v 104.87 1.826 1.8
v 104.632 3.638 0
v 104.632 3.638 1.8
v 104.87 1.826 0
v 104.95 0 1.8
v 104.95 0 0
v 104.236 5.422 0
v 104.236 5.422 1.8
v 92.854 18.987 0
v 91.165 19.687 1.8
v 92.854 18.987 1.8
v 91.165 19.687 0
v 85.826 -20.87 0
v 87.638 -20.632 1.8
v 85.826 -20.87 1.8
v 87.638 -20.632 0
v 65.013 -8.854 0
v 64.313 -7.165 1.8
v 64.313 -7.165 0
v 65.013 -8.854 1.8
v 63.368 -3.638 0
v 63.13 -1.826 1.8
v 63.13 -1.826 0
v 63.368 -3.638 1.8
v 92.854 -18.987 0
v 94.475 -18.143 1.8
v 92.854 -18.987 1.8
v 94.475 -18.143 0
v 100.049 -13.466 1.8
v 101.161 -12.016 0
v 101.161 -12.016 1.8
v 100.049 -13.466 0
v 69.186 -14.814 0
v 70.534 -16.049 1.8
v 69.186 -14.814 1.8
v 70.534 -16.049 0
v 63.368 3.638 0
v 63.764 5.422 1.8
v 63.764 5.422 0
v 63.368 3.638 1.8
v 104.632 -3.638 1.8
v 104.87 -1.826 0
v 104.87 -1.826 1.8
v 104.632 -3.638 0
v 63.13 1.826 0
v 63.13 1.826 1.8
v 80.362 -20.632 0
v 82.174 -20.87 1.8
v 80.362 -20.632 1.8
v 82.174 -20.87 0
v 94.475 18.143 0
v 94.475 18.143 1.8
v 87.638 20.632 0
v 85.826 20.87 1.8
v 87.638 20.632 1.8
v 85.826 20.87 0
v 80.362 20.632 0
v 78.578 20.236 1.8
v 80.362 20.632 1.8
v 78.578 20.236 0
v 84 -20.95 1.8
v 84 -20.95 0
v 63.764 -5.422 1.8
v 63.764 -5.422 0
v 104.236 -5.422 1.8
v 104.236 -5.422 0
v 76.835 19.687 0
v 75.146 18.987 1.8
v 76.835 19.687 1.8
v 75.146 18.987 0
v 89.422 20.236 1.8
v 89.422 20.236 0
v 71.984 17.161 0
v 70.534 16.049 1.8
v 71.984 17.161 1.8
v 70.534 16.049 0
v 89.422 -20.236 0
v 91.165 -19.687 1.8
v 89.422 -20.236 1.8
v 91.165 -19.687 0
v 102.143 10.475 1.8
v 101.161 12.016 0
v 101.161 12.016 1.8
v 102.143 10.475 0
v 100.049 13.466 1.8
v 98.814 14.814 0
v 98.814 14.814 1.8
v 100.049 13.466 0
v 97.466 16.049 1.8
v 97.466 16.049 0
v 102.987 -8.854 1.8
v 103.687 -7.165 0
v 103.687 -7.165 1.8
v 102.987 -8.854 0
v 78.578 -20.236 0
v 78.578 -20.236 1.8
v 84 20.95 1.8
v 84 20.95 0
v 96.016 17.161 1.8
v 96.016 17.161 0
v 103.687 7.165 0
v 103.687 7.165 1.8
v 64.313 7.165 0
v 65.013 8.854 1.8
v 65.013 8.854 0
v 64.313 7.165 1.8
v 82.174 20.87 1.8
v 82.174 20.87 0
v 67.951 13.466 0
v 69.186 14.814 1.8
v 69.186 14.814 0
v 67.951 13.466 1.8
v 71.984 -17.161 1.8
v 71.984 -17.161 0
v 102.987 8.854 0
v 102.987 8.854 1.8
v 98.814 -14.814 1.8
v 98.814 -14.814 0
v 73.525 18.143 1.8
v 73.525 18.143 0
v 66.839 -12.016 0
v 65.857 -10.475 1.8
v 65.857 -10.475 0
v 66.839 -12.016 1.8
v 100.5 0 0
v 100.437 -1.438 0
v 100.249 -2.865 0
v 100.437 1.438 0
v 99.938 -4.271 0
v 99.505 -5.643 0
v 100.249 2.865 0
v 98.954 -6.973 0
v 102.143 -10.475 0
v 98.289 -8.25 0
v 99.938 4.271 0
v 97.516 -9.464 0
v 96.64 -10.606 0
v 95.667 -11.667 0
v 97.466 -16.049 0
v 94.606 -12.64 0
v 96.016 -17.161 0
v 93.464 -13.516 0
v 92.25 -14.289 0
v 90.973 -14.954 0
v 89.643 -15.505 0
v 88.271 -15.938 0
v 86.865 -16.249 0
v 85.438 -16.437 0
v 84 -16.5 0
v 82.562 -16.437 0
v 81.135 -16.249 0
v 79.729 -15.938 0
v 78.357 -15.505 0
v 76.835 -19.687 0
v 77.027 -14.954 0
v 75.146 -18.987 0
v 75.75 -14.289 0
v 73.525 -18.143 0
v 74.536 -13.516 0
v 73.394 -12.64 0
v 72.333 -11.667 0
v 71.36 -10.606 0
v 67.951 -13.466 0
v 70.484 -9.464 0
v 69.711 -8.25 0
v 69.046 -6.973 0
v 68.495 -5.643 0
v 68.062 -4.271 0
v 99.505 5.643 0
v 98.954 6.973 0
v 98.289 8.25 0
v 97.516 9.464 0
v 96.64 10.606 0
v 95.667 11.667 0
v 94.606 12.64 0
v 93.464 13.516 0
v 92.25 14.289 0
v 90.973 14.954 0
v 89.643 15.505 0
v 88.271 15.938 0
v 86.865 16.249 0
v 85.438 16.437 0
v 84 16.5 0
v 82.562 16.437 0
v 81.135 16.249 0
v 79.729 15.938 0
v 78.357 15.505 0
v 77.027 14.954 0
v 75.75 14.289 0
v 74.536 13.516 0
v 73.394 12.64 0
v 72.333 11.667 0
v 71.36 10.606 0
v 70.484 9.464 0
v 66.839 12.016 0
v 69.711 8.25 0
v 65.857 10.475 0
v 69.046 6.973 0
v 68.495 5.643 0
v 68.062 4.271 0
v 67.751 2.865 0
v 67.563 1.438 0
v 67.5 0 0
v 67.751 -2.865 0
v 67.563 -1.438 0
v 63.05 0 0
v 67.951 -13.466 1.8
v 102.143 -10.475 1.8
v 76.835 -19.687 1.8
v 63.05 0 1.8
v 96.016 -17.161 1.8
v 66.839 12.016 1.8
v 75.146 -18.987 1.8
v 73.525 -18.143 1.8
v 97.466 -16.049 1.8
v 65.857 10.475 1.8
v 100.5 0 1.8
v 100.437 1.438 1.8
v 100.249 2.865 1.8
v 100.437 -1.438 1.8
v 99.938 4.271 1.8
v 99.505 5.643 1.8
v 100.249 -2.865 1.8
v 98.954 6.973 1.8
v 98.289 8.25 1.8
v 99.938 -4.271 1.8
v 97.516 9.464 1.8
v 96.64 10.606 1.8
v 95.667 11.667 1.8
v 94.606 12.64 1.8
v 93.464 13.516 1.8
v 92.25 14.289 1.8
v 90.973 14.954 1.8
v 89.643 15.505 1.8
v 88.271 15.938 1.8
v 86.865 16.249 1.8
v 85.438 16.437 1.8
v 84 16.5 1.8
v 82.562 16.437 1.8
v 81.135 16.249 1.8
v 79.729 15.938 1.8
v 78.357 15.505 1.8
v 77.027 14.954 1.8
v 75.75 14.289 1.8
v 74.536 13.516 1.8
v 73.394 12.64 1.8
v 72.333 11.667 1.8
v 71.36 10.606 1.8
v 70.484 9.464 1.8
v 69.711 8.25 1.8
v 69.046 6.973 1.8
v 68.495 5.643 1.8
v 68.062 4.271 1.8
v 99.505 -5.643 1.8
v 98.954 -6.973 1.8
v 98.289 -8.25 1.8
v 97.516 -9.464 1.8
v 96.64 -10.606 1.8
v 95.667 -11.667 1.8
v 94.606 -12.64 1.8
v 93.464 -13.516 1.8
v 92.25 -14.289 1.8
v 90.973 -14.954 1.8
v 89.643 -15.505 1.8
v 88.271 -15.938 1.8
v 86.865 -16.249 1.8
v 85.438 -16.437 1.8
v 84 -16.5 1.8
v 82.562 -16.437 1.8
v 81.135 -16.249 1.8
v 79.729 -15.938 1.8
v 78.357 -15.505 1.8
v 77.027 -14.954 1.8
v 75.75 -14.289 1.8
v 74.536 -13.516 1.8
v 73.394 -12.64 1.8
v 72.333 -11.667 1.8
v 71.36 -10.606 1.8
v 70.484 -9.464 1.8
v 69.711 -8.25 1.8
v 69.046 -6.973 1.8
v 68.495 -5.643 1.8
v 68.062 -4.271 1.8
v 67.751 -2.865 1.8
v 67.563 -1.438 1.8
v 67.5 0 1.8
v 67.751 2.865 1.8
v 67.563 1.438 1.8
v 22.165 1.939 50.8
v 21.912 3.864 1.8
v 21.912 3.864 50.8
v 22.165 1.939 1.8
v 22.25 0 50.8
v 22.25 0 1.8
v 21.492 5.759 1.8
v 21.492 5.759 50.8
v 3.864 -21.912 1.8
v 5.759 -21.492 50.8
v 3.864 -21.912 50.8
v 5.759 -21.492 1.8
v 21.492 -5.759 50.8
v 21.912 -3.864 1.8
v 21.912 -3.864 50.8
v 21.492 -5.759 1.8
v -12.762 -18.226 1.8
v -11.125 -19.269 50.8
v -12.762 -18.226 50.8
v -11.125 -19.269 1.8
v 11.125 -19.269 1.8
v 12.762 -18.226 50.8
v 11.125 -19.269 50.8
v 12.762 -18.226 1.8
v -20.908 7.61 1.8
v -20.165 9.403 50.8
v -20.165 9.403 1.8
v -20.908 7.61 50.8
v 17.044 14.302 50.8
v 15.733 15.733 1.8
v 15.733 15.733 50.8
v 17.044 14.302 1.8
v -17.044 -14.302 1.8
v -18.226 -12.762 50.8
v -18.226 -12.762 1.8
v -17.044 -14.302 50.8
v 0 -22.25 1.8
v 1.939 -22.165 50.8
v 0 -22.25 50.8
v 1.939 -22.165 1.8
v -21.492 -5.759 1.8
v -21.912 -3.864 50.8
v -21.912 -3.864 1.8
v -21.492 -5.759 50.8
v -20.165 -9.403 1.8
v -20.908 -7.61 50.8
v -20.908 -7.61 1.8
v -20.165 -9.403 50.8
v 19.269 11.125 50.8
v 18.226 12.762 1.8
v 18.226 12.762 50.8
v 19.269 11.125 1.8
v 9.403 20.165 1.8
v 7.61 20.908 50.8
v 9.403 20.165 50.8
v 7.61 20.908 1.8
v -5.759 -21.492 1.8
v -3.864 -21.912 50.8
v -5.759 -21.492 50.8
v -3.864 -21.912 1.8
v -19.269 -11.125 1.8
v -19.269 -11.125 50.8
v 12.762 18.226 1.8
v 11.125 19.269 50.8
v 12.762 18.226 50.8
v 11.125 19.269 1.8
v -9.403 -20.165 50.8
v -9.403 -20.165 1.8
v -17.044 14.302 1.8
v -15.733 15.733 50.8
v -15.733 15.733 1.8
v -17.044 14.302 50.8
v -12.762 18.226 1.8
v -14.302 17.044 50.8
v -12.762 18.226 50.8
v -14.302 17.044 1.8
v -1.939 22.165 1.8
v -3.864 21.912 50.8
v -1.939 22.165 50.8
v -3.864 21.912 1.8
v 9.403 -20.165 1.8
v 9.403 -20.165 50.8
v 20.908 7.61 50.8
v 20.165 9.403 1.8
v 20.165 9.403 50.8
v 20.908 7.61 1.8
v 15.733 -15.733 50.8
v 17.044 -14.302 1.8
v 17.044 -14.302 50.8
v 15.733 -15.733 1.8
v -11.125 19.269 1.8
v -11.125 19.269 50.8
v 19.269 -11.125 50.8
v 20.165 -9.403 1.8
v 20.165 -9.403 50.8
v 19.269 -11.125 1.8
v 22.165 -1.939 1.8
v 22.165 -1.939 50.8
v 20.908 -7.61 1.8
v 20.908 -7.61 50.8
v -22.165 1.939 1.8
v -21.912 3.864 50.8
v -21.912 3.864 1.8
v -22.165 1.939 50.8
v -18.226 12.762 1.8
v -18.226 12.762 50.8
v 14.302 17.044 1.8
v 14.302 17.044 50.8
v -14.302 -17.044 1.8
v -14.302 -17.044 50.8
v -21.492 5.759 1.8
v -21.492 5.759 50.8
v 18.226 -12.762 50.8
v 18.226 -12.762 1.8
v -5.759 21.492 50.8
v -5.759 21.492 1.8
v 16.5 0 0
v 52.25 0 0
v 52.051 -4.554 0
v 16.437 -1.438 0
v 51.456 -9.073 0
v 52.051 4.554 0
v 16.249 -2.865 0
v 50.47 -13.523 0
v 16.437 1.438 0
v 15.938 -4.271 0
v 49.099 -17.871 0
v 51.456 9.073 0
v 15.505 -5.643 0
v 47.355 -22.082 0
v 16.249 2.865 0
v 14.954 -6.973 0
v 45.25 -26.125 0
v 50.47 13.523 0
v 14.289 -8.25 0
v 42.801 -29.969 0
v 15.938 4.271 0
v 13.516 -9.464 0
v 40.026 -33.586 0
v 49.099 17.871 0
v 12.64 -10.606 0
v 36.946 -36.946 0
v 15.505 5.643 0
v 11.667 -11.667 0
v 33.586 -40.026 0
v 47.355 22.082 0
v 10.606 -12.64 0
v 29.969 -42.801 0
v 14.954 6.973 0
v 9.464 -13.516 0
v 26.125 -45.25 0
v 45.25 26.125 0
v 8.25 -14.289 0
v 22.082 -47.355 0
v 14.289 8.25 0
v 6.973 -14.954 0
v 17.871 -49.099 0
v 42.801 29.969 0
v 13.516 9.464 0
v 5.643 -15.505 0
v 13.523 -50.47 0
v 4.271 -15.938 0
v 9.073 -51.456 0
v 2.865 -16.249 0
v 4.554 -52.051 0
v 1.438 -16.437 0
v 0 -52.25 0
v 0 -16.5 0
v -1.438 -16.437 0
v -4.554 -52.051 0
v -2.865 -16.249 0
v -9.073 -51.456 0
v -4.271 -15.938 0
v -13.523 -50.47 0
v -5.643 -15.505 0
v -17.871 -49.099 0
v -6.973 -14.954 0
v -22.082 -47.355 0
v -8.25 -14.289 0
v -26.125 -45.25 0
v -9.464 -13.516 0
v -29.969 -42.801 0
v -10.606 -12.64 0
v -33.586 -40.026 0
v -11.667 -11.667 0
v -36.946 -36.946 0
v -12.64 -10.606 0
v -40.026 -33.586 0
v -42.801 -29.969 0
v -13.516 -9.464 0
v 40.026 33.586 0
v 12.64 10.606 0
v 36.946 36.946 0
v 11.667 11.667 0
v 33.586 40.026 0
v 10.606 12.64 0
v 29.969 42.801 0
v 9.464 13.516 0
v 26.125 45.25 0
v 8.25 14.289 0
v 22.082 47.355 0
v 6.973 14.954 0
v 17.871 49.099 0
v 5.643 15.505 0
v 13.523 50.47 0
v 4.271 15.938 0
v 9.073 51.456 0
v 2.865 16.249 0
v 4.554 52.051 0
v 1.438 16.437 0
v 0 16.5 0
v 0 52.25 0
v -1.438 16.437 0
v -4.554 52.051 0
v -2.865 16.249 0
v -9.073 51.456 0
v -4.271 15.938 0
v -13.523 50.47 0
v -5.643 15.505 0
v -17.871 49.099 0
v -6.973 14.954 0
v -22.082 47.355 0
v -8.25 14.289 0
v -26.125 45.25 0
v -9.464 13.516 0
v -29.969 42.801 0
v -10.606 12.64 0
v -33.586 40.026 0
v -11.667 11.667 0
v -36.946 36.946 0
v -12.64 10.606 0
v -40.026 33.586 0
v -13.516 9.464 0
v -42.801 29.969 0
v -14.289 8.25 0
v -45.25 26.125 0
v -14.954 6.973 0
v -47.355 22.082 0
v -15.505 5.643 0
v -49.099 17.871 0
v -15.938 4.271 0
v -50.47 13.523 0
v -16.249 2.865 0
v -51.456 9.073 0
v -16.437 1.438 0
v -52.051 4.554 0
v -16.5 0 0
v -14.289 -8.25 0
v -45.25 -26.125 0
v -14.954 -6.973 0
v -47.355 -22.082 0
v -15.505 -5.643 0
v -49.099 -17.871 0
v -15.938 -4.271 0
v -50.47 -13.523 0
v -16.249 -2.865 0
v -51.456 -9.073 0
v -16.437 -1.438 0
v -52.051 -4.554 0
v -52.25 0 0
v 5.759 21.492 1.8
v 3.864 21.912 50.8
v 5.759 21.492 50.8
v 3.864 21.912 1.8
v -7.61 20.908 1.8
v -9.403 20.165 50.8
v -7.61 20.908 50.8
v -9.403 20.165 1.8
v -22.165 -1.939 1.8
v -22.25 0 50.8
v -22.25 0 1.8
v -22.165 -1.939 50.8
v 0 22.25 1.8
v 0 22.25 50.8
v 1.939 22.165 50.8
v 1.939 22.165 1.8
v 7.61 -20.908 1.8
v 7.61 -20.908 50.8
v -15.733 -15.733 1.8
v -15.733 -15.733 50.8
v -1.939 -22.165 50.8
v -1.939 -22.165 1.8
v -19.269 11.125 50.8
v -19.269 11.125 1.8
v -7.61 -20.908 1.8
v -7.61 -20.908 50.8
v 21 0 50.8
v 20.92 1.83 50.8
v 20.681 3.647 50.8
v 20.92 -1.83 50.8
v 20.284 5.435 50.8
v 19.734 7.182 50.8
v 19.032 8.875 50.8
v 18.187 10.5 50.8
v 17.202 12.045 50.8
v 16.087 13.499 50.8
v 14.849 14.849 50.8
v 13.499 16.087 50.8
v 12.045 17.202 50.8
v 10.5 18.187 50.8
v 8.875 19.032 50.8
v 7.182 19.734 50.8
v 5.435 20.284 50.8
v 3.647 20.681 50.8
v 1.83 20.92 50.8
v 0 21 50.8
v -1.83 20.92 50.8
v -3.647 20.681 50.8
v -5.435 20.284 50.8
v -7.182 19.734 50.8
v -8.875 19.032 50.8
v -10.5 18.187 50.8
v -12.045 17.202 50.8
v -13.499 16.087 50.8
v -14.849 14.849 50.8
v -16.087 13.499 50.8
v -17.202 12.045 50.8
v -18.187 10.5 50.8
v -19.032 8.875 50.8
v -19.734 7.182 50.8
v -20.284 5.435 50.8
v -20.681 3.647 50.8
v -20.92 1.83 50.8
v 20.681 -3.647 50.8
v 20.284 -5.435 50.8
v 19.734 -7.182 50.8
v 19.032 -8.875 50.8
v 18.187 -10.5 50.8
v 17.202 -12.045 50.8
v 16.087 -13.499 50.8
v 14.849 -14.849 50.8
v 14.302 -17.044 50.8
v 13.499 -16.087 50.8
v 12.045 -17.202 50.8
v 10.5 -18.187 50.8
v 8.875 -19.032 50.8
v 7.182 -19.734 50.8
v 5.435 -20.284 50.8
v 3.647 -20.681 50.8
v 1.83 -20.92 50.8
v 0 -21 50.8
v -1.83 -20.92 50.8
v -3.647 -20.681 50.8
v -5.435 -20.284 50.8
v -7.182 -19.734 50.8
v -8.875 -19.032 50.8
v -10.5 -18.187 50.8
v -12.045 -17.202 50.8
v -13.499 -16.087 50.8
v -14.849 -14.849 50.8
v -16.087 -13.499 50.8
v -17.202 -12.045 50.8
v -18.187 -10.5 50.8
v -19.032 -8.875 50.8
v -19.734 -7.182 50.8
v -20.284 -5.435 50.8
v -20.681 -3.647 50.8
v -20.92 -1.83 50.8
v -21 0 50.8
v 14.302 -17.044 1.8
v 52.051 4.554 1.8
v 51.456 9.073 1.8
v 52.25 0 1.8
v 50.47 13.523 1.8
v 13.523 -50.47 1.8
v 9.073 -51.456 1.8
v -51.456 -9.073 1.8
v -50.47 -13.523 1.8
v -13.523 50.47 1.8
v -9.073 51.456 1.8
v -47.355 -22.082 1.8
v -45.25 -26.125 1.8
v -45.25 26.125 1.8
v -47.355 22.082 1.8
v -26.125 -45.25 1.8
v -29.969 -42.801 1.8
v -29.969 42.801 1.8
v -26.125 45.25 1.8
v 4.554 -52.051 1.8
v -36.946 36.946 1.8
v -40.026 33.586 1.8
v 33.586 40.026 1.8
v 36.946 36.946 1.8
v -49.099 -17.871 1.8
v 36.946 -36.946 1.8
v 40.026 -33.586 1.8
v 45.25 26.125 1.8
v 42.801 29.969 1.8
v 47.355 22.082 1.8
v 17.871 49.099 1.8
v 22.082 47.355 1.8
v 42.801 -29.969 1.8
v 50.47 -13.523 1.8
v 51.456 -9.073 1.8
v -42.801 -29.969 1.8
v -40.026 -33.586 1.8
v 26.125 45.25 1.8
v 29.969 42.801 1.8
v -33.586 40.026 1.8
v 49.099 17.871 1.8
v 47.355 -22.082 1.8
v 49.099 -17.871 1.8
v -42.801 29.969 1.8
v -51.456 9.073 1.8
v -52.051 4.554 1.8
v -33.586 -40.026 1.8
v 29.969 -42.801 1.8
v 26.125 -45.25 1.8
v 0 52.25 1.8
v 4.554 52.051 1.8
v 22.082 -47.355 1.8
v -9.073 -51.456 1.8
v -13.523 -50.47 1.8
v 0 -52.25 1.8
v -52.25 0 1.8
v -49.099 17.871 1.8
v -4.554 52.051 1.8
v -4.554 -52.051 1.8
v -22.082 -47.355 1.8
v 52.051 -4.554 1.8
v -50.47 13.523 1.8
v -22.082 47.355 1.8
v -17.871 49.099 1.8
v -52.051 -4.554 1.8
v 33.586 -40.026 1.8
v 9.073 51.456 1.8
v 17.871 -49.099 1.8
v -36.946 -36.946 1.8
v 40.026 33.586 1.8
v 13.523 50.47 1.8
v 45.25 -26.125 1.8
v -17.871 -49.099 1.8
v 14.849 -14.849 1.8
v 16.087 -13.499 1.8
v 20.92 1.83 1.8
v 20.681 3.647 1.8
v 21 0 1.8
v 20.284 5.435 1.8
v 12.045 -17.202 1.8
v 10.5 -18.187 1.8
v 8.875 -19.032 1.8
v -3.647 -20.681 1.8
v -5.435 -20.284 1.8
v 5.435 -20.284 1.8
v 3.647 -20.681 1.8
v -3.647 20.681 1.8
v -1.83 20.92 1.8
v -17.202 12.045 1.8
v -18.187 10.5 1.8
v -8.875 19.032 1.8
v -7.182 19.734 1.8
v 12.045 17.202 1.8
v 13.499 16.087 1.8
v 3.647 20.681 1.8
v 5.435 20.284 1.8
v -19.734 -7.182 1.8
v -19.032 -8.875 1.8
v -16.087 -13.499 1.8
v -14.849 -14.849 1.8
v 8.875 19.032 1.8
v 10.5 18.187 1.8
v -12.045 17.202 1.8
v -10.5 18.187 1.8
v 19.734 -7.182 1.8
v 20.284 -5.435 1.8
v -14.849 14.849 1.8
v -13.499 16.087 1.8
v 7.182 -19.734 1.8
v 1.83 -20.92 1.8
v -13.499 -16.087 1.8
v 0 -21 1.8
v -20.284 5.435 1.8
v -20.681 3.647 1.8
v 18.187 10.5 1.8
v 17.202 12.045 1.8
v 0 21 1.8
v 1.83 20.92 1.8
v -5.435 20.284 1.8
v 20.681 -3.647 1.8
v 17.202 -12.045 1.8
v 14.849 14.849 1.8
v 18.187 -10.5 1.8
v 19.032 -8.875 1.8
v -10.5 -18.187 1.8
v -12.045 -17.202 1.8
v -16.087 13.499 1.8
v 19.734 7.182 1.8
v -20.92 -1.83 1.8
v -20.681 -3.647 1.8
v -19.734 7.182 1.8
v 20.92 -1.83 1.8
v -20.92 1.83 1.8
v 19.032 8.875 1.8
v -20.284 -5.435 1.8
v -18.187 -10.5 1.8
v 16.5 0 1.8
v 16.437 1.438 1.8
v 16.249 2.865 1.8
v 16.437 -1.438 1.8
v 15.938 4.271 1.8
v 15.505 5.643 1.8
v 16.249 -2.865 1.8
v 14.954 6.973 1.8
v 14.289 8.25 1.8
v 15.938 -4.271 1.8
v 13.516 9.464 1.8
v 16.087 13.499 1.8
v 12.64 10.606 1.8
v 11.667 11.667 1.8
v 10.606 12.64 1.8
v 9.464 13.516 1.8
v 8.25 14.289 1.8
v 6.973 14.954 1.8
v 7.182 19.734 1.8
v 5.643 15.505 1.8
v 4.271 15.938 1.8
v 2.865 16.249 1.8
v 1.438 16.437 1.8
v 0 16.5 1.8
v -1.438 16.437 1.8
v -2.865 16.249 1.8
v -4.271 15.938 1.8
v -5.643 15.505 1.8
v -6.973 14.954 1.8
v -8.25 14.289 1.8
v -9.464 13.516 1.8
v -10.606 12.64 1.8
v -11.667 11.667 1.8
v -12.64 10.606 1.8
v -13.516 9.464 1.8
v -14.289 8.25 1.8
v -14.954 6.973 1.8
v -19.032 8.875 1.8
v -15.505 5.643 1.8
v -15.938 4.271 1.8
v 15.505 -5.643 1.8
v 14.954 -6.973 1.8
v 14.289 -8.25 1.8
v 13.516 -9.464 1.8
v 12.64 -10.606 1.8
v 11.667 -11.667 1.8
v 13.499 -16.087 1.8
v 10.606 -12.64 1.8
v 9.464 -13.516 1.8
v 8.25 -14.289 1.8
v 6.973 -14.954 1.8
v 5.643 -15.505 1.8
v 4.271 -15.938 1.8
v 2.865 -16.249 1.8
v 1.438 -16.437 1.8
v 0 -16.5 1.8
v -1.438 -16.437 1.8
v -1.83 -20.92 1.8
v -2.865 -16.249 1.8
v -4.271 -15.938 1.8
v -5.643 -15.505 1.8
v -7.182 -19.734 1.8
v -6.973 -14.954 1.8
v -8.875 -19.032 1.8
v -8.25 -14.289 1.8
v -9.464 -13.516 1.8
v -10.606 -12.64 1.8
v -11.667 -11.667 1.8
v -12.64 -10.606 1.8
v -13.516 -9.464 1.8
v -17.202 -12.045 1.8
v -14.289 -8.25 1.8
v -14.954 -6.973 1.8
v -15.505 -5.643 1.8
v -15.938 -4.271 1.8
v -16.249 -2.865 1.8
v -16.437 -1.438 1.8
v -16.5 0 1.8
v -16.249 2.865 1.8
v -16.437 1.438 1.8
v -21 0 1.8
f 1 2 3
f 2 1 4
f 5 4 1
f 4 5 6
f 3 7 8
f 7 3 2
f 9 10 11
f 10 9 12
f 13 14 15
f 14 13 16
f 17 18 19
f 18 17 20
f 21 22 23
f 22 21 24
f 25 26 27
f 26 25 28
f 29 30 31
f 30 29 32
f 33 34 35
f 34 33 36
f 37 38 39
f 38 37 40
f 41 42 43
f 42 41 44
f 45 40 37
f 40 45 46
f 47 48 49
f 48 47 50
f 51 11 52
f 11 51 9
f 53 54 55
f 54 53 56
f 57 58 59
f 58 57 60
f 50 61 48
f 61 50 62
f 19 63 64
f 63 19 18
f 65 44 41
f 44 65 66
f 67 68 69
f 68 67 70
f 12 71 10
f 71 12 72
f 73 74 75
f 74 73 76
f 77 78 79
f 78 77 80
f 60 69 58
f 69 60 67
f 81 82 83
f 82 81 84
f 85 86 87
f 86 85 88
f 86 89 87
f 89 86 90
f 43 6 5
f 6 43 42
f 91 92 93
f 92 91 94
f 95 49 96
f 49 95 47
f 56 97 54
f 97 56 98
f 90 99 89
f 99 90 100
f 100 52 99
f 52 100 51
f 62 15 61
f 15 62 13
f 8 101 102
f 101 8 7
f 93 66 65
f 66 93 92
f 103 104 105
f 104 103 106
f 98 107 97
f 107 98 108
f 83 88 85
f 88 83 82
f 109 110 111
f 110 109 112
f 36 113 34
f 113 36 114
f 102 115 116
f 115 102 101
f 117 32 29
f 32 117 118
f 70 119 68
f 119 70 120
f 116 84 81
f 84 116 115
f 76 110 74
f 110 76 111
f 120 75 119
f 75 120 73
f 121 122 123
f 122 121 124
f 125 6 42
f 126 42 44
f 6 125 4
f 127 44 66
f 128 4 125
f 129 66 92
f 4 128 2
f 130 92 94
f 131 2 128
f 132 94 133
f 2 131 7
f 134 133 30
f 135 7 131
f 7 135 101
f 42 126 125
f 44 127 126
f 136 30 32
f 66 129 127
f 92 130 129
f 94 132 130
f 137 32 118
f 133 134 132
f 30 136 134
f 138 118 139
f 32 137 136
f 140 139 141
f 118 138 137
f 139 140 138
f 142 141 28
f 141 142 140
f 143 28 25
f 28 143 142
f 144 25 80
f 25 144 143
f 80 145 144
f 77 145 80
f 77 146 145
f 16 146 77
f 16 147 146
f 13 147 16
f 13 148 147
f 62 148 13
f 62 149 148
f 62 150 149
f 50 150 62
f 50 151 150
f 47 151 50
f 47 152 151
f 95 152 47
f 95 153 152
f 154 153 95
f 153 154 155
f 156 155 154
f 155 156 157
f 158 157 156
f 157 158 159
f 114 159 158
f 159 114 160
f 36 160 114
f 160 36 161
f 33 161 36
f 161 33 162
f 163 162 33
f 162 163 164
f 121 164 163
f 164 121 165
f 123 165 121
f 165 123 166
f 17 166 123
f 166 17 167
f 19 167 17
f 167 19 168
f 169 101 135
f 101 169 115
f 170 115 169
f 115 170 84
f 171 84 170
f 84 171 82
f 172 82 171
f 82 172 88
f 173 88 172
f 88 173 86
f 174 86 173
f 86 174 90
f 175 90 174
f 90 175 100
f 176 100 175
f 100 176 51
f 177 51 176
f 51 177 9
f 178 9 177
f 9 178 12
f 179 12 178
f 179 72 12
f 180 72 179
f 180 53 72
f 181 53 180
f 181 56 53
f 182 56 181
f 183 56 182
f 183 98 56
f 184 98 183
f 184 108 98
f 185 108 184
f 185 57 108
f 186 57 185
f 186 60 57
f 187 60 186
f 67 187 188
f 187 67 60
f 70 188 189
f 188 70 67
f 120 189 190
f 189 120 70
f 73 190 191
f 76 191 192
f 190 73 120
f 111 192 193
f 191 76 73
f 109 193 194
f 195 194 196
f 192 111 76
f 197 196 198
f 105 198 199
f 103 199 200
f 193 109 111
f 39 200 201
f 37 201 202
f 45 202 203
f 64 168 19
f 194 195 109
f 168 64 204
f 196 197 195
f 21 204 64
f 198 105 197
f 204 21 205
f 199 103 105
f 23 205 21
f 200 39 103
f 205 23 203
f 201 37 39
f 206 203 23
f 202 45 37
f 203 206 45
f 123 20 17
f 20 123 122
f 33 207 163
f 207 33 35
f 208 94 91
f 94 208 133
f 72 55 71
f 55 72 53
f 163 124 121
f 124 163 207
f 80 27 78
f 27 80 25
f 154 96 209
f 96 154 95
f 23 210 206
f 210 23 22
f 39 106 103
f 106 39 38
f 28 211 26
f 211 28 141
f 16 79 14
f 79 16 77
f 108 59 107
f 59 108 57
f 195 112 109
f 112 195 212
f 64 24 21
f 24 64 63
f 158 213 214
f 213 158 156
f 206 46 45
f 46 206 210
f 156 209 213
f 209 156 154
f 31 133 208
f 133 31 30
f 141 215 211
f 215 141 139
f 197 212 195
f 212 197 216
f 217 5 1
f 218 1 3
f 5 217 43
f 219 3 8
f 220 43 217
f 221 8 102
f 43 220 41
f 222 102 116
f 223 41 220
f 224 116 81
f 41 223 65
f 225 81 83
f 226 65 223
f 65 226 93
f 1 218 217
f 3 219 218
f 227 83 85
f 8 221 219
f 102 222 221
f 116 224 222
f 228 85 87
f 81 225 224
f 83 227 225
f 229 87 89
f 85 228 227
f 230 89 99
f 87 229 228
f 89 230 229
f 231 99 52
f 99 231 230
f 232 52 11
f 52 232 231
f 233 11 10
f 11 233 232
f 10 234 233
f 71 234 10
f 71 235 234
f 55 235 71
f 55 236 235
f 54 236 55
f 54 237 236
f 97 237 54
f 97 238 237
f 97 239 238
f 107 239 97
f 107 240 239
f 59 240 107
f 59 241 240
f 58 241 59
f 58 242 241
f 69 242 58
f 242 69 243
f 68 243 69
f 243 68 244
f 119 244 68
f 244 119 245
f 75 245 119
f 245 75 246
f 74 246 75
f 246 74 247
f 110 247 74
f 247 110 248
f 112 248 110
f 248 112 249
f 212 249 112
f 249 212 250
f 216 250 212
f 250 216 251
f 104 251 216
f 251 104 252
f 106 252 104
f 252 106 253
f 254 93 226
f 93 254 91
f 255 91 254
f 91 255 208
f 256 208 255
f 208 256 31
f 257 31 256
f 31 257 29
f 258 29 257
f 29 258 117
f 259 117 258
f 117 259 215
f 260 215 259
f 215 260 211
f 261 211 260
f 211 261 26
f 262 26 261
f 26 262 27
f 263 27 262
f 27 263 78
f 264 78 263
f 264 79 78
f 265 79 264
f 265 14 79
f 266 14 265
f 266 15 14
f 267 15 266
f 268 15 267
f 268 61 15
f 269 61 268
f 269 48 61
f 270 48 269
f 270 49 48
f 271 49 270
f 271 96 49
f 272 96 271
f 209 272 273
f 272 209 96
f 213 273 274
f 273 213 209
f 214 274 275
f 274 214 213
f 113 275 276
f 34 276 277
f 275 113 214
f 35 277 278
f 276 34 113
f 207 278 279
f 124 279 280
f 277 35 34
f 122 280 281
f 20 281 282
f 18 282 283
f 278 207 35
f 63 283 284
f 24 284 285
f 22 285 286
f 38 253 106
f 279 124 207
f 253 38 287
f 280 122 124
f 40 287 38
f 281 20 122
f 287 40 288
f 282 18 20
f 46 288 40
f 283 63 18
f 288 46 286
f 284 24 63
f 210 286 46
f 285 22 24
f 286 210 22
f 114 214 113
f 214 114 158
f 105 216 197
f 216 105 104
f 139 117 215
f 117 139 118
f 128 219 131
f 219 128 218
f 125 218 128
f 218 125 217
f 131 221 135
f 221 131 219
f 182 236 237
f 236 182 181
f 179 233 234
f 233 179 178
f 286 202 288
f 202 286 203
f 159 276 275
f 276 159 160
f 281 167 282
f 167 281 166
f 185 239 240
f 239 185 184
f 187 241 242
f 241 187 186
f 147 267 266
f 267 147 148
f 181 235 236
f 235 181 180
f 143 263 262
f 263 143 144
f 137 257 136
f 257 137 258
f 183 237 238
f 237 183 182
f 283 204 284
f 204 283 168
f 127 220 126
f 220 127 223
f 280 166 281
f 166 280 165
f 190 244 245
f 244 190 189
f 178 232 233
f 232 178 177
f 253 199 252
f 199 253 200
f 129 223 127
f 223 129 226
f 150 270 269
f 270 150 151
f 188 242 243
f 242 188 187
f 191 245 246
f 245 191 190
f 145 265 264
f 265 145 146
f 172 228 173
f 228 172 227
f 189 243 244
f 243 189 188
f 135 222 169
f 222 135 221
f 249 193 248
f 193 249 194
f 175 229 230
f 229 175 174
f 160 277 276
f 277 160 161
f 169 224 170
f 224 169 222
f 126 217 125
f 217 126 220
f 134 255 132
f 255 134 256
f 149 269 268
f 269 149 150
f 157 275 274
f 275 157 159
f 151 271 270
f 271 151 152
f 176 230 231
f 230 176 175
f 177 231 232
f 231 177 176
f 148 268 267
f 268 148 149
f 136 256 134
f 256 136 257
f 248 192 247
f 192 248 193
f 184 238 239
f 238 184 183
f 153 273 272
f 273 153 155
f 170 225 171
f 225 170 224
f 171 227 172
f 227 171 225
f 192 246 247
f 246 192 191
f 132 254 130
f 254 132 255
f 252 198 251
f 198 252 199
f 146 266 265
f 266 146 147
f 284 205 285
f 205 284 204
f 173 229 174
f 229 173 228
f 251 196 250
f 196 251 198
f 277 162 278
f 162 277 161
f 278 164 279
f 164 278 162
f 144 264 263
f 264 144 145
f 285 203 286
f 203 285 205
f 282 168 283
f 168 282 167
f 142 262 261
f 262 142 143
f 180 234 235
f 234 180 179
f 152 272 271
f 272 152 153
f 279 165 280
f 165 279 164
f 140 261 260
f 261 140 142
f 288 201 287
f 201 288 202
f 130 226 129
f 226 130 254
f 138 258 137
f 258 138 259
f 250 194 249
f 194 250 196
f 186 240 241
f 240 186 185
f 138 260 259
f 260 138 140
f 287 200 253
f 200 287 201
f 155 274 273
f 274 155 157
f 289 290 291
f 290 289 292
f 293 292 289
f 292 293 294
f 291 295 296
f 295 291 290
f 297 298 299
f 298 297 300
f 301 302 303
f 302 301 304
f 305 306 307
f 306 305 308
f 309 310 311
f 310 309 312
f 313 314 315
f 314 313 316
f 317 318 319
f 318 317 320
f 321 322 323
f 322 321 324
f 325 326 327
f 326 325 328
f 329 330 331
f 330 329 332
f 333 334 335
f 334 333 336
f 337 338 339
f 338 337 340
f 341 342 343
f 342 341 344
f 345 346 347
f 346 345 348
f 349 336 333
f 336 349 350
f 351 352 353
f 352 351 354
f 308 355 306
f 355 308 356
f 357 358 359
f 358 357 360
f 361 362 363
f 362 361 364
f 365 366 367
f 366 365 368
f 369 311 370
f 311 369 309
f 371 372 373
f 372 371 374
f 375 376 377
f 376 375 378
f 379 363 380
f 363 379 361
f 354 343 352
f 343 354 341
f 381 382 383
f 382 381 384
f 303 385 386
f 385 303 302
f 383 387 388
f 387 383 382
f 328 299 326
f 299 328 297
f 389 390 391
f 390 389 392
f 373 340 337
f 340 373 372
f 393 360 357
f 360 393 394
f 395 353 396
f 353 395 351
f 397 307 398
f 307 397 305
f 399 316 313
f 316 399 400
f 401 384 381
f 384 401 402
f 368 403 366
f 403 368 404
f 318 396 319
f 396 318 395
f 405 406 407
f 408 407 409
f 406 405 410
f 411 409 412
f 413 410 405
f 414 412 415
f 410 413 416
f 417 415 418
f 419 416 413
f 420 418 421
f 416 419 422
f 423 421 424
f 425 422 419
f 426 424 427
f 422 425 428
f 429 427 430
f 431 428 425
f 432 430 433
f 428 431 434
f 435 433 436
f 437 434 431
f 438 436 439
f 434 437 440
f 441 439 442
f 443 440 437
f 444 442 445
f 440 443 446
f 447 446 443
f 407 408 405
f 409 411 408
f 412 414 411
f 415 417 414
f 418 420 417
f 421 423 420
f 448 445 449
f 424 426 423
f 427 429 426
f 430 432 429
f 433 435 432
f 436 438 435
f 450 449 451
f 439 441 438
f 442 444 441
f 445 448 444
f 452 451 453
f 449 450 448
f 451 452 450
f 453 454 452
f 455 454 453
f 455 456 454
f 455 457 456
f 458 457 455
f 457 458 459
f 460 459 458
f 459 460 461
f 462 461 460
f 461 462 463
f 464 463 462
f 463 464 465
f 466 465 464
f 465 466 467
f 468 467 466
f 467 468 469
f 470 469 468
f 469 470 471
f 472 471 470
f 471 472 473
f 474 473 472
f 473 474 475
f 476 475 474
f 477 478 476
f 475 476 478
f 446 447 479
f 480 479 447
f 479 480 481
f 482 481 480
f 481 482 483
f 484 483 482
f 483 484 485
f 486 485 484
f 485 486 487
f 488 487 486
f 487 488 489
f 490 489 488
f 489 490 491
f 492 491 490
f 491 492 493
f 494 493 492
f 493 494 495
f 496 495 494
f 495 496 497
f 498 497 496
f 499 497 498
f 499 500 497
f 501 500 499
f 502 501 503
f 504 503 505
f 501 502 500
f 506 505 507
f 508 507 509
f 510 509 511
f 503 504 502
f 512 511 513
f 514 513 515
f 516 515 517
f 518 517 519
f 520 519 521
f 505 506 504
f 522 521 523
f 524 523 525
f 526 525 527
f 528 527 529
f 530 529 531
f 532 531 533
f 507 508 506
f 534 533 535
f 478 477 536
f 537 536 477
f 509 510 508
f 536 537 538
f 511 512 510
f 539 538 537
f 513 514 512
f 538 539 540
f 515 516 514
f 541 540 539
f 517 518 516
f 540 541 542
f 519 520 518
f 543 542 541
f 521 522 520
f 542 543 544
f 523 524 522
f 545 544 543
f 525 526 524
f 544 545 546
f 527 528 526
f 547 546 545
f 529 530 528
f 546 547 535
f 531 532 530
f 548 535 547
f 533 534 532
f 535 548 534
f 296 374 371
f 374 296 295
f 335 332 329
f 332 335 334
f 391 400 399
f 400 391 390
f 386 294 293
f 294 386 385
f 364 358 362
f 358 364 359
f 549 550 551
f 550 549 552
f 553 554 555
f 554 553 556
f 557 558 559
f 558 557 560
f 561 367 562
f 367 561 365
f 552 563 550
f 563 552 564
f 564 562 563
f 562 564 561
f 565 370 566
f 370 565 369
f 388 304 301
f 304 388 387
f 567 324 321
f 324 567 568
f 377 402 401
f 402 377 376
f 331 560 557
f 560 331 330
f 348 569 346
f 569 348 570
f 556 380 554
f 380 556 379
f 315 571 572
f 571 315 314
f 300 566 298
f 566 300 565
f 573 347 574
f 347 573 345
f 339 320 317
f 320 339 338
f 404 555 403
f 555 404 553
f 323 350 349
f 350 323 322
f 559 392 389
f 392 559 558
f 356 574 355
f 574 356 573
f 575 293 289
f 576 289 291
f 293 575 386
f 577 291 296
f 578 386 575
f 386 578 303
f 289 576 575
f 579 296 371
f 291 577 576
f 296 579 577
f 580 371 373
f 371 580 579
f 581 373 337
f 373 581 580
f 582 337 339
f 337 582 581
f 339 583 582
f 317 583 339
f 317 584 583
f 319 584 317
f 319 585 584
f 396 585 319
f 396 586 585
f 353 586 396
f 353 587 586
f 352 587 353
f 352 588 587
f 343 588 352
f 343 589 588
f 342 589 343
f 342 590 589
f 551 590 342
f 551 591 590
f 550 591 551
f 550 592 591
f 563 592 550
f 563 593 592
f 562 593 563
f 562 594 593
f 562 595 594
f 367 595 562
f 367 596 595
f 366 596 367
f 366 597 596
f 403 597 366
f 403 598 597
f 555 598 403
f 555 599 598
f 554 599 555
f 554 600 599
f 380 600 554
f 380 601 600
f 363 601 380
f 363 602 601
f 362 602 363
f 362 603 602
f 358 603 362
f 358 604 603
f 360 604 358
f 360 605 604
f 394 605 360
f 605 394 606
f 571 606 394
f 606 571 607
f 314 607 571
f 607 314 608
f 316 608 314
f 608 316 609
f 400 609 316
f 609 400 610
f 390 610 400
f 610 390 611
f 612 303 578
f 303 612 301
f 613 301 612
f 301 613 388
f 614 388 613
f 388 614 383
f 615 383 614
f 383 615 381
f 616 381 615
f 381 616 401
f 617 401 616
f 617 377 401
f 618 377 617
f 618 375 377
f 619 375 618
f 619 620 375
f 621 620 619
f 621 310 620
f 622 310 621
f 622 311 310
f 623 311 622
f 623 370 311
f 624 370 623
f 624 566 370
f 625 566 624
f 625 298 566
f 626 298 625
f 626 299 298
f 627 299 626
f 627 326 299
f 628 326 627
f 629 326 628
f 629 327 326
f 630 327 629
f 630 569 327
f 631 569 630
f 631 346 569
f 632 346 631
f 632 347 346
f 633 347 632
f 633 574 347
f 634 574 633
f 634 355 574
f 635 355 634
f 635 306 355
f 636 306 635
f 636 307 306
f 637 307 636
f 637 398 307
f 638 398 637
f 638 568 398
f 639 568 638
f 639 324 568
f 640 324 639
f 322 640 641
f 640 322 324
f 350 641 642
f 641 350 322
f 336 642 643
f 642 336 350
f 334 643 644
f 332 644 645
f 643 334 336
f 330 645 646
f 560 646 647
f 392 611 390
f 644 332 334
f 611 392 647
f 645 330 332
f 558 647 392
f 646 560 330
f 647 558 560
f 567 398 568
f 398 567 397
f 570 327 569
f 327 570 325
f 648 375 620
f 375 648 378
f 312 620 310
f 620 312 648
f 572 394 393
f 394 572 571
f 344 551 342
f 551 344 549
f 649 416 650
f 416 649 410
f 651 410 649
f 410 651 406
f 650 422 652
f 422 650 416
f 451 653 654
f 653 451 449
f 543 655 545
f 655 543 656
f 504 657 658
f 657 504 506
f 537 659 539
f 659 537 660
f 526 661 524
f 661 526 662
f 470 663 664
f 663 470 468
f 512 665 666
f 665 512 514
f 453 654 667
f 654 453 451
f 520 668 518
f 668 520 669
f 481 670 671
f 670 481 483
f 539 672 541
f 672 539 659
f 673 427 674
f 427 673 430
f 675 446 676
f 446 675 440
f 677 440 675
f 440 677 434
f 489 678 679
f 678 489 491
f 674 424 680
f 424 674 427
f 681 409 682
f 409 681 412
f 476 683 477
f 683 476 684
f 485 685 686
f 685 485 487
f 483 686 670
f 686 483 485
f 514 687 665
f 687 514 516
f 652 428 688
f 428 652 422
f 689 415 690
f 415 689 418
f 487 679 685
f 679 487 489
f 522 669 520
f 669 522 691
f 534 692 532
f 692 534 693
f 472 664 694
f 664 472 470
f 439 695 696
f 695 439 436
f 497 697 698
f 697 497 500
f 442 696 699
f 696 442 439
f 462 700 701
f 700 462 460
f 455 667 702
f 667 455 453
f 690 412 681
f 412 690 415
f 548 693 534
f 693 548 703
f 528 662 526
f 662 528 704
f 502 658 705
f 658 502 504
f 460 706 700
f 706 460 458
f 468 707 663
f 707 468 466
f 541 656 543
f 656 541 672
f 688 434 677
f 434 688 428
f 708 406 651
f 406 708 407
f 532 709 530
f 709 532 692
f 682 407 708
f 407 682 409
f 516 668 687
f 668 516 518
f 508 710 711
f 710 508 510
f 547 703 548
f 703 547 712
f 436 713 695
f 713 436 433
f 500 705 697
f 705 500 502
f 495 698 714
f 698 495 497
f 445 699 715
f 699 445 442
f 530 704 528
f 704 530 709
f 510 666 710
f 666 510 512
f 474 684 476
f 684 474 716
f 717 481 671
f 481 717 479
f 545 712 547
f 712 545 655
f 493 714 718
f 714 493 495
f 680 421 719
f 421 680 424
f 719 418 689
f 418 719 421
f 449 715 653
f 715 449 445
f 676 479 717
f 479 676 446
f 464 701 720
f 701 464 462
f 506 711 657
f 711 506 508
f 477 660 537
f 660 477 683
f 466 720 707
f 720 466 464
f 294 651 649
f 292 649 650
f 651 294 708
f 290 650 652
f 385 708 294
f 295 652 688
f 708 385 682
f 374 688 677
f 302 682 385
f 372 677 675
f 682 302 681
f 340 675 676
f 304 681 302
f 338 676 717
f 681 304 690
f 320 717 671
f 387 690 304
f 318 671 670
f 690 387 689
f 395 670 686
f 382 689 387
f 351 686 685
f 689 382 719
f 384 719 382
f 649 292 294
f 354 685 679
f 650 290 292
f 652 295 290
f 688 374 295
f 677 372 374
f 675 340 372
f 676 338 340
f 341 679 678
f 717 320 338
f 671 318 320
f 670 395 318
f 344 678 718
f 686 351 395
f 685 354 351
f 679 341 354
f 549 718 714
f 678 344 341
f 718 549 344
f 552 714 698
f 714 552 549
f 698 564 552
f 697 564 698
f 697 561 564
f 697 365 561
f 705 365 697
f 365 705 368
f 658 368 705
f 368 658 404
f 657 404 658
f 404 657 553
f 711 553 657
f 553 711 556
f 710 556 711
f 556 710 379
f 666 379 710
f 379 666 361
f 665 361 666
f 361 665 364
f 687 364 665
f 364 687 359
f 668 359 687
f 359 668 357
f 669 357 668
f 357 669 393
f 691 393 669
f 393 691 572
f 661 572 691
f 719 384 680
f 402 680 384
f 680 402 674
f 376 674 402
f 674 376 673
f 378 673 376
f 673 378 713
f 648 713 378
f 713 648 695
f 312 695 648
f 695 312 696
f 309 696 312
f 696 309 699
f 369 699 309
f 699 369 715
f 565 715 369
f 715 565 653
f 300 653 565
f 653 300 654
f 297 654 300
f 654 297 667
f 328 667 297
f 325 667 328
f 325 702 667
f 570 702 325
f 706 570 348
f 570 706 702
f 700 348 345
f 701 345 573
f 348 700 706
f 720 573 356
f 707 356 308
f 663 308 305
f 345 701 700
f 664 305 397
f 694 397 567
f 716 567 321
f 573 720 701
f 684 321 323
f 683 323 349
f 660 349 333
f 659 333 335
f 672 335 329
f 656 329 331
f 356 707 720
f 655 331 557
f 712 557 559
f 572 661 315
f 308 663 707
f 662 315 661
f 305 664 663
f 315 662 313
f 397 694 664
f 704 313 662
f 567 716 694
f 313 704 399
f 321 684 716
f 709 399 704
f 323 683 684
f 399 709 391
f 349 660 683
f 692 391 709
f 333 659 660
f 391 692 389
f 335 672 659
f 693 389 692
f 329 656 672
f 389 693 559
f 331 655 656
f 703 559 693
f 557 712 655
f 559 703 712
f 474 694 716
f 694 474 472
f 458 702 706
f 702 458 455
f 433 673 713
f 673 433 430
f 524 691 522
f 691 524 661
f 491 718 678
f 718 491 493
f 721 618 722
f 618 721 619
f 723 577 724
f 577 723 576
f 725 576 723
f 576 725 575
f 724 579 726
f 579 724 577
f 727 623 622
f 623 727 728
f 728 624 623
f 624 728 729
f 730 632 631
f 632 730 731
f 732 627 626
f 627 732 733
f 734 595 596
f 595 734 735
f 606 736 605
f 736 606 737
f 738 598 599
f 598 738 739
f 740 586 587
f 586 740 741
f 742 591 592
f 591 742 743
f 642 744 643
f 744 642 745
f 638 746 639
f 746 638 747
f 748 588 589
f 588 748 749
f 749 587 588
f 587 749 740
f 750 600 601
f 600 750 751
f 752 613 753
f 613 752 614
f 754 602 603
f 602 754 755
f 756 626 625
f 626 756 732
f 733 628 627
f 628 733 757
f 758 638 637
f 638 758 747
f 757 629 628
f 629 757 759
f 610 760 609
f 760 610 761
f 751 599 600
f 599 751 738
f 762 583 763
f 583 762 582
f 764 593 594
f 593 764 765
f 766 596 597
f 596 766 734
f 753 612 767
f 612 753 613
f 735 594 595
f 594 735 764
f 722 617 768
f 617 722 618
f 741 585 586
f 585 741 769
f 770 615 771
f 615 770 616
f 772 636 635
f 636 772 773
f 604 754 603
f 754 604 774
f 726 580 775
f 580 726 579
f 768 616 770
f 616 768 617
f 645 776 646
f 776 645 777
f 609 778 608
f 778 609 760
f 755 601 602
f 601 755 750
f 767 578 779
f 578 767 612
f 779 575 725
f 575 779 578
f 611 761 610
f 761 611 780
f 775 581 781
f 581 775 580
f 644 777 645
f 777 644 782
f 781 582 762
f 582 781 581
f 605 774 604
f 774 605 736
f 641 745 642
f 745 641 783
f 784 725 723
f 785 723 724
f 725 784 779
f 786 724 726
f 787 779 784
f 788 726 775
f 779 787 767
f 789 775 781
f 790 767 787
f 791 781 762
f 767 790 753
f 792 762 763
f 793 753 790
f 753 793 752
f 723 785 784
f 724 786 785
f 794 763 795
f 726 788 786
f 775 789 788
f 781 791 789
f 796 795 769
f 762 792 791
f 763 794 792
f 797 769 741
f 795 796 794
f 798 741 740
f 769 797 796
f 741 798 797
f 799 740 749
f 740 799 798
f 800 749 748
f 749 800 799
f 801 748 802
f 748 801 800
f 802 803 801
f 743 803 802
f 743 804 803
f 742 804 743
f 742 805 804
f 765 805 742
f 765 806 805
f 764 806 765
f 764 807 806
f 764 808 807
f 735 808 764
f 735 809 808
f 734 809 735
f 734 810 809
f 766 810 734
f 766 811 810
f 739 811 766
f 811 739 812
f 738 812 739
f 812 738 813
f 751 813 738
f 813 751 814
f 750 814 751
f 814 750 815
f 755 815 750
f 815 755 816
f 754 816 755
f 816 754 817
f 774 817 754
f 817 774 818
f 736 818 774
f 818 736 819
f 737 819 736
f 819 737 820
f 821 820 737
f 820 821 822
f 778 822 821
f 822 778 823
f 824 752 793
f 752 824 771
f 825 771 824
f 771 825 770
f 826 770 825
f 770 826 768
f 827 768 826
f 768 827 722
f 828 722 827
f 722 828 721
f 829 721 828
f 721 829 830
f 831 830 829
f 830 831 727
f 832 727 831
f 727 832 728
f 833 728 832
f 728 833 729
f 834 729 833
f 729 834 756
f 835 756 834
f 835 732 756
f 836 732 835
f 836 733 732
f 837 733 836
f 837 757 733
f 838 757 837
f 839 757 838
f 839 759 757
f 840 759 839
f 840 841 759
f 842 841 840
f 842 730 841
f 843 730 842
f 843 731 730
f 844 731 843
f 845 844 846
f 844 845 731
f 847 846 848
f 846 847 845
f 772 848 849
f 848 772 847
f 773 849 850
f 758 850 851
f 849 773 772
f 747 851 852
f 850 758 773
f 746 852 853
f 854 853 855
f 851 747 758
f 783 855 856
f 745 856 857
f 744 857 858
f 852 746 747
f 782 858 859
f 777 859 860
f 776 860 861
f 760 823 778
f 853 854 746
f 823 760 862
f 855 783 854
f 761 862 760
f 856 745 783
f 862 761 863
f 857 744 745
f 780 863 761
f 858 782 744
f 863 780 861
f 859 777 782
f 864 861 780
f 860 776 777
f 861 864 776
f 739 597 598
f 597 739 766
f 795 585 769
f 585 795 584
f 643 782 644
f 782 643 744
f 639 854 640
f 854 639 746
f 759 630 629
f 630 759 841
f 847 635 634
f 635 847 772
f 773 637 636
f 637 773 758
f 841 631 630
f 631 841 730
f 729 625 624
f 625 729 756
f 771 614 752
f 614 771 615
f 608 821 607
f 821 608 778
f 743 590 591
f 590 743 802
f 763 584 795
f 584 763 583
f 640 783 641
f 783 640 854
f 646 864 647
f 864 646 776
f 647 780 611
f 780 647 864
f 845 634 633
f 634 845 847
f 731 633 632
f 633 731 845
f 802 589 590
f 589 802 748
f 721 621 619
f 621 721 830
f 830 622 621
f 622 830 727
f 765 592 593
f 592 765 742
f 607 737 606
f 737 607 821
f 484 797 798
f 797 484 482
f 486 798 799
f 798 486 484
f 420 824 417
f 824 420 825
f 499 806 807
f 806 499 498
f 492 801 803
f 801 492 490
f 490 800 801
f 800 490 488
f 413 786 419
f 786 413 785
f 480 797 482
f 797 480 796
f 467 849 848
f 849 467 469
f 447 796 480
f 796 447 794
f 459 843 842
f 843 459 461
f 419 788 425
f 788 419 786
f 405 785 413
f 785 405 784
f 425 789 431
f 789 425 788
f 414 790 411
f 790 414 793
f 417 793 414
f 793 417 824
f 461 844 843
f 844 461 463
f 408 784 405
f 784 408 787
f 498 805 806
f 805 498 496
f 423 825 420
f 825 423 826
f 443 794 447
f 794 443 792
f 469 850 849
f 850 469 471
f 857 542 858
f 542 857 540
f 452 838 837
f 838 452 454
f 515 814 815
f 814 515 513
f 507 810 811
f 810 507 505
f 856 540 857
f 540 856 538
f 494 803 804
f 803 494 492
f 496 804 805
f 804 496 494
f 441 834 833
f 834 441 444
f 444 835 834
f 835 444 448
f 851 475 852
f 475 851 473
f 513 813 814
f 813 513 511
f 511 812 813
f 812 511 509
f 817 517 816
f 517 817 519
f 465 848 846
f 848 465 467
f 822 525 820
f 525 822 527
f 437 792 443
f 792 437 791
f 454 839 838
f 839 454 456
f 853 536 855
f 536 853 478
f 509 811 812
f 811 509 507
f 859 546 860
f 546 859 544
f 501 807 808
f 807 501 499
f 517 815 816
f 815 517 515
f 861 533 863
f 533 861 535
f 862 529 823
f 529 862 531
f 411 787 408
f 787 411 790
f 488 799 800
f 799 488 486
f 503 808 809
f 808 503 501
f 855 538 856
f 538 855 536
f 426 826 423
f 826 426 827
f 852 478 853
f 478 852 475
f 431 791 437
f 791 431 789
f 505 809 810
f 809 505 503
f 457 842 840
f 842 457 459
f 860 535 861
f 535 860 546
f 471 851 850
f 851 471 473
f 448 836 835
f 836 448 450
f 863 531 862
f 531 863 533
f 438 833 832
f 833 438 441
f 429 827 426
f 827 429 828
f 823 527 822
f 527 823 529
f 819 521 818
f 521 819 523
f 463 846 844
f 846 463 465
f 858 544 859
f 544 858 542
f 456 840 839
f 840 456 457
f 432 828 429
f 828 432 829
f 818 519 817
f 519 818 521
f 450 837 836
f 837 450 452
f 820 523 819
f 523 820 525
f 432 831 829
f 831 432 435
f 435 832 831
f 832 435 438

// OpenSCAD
// holds a lens, like from a pair of reading glasses,
// for use in projecting an image of the sun

lens_widest = 42;
lens_aperture = 33;
height = 50.8;
wall_thickness = 2.5;
base_thickness = 1.8;
shield_width = 60;


module tube() {
  $fn=72;
  difference() {
    union() {
      cylinder(h=height, d=lens_widest + wall_thickness);
      cylinder(h=base_thickness, d=(lens_widest + wall_thickness + shield_width));
    };
    translate([0, 0, base_thickness]) cylinder(h=height, d=lens_widest);
    translate([0, 0, -1]) cylinder(h=height + 2, d=lens_aperture);
  };
  
};

module plug() {
  $fn=72;
  difference() {
    cylinder(d=lens_widest - 0.1, h=base_thickness);
    translate([0, 0, -1]) cylinder(d=lens_aperture, h=base_thickness + 2);
  };
};


translate([2*lens_widest, 0, 0]) plug();
tube();
